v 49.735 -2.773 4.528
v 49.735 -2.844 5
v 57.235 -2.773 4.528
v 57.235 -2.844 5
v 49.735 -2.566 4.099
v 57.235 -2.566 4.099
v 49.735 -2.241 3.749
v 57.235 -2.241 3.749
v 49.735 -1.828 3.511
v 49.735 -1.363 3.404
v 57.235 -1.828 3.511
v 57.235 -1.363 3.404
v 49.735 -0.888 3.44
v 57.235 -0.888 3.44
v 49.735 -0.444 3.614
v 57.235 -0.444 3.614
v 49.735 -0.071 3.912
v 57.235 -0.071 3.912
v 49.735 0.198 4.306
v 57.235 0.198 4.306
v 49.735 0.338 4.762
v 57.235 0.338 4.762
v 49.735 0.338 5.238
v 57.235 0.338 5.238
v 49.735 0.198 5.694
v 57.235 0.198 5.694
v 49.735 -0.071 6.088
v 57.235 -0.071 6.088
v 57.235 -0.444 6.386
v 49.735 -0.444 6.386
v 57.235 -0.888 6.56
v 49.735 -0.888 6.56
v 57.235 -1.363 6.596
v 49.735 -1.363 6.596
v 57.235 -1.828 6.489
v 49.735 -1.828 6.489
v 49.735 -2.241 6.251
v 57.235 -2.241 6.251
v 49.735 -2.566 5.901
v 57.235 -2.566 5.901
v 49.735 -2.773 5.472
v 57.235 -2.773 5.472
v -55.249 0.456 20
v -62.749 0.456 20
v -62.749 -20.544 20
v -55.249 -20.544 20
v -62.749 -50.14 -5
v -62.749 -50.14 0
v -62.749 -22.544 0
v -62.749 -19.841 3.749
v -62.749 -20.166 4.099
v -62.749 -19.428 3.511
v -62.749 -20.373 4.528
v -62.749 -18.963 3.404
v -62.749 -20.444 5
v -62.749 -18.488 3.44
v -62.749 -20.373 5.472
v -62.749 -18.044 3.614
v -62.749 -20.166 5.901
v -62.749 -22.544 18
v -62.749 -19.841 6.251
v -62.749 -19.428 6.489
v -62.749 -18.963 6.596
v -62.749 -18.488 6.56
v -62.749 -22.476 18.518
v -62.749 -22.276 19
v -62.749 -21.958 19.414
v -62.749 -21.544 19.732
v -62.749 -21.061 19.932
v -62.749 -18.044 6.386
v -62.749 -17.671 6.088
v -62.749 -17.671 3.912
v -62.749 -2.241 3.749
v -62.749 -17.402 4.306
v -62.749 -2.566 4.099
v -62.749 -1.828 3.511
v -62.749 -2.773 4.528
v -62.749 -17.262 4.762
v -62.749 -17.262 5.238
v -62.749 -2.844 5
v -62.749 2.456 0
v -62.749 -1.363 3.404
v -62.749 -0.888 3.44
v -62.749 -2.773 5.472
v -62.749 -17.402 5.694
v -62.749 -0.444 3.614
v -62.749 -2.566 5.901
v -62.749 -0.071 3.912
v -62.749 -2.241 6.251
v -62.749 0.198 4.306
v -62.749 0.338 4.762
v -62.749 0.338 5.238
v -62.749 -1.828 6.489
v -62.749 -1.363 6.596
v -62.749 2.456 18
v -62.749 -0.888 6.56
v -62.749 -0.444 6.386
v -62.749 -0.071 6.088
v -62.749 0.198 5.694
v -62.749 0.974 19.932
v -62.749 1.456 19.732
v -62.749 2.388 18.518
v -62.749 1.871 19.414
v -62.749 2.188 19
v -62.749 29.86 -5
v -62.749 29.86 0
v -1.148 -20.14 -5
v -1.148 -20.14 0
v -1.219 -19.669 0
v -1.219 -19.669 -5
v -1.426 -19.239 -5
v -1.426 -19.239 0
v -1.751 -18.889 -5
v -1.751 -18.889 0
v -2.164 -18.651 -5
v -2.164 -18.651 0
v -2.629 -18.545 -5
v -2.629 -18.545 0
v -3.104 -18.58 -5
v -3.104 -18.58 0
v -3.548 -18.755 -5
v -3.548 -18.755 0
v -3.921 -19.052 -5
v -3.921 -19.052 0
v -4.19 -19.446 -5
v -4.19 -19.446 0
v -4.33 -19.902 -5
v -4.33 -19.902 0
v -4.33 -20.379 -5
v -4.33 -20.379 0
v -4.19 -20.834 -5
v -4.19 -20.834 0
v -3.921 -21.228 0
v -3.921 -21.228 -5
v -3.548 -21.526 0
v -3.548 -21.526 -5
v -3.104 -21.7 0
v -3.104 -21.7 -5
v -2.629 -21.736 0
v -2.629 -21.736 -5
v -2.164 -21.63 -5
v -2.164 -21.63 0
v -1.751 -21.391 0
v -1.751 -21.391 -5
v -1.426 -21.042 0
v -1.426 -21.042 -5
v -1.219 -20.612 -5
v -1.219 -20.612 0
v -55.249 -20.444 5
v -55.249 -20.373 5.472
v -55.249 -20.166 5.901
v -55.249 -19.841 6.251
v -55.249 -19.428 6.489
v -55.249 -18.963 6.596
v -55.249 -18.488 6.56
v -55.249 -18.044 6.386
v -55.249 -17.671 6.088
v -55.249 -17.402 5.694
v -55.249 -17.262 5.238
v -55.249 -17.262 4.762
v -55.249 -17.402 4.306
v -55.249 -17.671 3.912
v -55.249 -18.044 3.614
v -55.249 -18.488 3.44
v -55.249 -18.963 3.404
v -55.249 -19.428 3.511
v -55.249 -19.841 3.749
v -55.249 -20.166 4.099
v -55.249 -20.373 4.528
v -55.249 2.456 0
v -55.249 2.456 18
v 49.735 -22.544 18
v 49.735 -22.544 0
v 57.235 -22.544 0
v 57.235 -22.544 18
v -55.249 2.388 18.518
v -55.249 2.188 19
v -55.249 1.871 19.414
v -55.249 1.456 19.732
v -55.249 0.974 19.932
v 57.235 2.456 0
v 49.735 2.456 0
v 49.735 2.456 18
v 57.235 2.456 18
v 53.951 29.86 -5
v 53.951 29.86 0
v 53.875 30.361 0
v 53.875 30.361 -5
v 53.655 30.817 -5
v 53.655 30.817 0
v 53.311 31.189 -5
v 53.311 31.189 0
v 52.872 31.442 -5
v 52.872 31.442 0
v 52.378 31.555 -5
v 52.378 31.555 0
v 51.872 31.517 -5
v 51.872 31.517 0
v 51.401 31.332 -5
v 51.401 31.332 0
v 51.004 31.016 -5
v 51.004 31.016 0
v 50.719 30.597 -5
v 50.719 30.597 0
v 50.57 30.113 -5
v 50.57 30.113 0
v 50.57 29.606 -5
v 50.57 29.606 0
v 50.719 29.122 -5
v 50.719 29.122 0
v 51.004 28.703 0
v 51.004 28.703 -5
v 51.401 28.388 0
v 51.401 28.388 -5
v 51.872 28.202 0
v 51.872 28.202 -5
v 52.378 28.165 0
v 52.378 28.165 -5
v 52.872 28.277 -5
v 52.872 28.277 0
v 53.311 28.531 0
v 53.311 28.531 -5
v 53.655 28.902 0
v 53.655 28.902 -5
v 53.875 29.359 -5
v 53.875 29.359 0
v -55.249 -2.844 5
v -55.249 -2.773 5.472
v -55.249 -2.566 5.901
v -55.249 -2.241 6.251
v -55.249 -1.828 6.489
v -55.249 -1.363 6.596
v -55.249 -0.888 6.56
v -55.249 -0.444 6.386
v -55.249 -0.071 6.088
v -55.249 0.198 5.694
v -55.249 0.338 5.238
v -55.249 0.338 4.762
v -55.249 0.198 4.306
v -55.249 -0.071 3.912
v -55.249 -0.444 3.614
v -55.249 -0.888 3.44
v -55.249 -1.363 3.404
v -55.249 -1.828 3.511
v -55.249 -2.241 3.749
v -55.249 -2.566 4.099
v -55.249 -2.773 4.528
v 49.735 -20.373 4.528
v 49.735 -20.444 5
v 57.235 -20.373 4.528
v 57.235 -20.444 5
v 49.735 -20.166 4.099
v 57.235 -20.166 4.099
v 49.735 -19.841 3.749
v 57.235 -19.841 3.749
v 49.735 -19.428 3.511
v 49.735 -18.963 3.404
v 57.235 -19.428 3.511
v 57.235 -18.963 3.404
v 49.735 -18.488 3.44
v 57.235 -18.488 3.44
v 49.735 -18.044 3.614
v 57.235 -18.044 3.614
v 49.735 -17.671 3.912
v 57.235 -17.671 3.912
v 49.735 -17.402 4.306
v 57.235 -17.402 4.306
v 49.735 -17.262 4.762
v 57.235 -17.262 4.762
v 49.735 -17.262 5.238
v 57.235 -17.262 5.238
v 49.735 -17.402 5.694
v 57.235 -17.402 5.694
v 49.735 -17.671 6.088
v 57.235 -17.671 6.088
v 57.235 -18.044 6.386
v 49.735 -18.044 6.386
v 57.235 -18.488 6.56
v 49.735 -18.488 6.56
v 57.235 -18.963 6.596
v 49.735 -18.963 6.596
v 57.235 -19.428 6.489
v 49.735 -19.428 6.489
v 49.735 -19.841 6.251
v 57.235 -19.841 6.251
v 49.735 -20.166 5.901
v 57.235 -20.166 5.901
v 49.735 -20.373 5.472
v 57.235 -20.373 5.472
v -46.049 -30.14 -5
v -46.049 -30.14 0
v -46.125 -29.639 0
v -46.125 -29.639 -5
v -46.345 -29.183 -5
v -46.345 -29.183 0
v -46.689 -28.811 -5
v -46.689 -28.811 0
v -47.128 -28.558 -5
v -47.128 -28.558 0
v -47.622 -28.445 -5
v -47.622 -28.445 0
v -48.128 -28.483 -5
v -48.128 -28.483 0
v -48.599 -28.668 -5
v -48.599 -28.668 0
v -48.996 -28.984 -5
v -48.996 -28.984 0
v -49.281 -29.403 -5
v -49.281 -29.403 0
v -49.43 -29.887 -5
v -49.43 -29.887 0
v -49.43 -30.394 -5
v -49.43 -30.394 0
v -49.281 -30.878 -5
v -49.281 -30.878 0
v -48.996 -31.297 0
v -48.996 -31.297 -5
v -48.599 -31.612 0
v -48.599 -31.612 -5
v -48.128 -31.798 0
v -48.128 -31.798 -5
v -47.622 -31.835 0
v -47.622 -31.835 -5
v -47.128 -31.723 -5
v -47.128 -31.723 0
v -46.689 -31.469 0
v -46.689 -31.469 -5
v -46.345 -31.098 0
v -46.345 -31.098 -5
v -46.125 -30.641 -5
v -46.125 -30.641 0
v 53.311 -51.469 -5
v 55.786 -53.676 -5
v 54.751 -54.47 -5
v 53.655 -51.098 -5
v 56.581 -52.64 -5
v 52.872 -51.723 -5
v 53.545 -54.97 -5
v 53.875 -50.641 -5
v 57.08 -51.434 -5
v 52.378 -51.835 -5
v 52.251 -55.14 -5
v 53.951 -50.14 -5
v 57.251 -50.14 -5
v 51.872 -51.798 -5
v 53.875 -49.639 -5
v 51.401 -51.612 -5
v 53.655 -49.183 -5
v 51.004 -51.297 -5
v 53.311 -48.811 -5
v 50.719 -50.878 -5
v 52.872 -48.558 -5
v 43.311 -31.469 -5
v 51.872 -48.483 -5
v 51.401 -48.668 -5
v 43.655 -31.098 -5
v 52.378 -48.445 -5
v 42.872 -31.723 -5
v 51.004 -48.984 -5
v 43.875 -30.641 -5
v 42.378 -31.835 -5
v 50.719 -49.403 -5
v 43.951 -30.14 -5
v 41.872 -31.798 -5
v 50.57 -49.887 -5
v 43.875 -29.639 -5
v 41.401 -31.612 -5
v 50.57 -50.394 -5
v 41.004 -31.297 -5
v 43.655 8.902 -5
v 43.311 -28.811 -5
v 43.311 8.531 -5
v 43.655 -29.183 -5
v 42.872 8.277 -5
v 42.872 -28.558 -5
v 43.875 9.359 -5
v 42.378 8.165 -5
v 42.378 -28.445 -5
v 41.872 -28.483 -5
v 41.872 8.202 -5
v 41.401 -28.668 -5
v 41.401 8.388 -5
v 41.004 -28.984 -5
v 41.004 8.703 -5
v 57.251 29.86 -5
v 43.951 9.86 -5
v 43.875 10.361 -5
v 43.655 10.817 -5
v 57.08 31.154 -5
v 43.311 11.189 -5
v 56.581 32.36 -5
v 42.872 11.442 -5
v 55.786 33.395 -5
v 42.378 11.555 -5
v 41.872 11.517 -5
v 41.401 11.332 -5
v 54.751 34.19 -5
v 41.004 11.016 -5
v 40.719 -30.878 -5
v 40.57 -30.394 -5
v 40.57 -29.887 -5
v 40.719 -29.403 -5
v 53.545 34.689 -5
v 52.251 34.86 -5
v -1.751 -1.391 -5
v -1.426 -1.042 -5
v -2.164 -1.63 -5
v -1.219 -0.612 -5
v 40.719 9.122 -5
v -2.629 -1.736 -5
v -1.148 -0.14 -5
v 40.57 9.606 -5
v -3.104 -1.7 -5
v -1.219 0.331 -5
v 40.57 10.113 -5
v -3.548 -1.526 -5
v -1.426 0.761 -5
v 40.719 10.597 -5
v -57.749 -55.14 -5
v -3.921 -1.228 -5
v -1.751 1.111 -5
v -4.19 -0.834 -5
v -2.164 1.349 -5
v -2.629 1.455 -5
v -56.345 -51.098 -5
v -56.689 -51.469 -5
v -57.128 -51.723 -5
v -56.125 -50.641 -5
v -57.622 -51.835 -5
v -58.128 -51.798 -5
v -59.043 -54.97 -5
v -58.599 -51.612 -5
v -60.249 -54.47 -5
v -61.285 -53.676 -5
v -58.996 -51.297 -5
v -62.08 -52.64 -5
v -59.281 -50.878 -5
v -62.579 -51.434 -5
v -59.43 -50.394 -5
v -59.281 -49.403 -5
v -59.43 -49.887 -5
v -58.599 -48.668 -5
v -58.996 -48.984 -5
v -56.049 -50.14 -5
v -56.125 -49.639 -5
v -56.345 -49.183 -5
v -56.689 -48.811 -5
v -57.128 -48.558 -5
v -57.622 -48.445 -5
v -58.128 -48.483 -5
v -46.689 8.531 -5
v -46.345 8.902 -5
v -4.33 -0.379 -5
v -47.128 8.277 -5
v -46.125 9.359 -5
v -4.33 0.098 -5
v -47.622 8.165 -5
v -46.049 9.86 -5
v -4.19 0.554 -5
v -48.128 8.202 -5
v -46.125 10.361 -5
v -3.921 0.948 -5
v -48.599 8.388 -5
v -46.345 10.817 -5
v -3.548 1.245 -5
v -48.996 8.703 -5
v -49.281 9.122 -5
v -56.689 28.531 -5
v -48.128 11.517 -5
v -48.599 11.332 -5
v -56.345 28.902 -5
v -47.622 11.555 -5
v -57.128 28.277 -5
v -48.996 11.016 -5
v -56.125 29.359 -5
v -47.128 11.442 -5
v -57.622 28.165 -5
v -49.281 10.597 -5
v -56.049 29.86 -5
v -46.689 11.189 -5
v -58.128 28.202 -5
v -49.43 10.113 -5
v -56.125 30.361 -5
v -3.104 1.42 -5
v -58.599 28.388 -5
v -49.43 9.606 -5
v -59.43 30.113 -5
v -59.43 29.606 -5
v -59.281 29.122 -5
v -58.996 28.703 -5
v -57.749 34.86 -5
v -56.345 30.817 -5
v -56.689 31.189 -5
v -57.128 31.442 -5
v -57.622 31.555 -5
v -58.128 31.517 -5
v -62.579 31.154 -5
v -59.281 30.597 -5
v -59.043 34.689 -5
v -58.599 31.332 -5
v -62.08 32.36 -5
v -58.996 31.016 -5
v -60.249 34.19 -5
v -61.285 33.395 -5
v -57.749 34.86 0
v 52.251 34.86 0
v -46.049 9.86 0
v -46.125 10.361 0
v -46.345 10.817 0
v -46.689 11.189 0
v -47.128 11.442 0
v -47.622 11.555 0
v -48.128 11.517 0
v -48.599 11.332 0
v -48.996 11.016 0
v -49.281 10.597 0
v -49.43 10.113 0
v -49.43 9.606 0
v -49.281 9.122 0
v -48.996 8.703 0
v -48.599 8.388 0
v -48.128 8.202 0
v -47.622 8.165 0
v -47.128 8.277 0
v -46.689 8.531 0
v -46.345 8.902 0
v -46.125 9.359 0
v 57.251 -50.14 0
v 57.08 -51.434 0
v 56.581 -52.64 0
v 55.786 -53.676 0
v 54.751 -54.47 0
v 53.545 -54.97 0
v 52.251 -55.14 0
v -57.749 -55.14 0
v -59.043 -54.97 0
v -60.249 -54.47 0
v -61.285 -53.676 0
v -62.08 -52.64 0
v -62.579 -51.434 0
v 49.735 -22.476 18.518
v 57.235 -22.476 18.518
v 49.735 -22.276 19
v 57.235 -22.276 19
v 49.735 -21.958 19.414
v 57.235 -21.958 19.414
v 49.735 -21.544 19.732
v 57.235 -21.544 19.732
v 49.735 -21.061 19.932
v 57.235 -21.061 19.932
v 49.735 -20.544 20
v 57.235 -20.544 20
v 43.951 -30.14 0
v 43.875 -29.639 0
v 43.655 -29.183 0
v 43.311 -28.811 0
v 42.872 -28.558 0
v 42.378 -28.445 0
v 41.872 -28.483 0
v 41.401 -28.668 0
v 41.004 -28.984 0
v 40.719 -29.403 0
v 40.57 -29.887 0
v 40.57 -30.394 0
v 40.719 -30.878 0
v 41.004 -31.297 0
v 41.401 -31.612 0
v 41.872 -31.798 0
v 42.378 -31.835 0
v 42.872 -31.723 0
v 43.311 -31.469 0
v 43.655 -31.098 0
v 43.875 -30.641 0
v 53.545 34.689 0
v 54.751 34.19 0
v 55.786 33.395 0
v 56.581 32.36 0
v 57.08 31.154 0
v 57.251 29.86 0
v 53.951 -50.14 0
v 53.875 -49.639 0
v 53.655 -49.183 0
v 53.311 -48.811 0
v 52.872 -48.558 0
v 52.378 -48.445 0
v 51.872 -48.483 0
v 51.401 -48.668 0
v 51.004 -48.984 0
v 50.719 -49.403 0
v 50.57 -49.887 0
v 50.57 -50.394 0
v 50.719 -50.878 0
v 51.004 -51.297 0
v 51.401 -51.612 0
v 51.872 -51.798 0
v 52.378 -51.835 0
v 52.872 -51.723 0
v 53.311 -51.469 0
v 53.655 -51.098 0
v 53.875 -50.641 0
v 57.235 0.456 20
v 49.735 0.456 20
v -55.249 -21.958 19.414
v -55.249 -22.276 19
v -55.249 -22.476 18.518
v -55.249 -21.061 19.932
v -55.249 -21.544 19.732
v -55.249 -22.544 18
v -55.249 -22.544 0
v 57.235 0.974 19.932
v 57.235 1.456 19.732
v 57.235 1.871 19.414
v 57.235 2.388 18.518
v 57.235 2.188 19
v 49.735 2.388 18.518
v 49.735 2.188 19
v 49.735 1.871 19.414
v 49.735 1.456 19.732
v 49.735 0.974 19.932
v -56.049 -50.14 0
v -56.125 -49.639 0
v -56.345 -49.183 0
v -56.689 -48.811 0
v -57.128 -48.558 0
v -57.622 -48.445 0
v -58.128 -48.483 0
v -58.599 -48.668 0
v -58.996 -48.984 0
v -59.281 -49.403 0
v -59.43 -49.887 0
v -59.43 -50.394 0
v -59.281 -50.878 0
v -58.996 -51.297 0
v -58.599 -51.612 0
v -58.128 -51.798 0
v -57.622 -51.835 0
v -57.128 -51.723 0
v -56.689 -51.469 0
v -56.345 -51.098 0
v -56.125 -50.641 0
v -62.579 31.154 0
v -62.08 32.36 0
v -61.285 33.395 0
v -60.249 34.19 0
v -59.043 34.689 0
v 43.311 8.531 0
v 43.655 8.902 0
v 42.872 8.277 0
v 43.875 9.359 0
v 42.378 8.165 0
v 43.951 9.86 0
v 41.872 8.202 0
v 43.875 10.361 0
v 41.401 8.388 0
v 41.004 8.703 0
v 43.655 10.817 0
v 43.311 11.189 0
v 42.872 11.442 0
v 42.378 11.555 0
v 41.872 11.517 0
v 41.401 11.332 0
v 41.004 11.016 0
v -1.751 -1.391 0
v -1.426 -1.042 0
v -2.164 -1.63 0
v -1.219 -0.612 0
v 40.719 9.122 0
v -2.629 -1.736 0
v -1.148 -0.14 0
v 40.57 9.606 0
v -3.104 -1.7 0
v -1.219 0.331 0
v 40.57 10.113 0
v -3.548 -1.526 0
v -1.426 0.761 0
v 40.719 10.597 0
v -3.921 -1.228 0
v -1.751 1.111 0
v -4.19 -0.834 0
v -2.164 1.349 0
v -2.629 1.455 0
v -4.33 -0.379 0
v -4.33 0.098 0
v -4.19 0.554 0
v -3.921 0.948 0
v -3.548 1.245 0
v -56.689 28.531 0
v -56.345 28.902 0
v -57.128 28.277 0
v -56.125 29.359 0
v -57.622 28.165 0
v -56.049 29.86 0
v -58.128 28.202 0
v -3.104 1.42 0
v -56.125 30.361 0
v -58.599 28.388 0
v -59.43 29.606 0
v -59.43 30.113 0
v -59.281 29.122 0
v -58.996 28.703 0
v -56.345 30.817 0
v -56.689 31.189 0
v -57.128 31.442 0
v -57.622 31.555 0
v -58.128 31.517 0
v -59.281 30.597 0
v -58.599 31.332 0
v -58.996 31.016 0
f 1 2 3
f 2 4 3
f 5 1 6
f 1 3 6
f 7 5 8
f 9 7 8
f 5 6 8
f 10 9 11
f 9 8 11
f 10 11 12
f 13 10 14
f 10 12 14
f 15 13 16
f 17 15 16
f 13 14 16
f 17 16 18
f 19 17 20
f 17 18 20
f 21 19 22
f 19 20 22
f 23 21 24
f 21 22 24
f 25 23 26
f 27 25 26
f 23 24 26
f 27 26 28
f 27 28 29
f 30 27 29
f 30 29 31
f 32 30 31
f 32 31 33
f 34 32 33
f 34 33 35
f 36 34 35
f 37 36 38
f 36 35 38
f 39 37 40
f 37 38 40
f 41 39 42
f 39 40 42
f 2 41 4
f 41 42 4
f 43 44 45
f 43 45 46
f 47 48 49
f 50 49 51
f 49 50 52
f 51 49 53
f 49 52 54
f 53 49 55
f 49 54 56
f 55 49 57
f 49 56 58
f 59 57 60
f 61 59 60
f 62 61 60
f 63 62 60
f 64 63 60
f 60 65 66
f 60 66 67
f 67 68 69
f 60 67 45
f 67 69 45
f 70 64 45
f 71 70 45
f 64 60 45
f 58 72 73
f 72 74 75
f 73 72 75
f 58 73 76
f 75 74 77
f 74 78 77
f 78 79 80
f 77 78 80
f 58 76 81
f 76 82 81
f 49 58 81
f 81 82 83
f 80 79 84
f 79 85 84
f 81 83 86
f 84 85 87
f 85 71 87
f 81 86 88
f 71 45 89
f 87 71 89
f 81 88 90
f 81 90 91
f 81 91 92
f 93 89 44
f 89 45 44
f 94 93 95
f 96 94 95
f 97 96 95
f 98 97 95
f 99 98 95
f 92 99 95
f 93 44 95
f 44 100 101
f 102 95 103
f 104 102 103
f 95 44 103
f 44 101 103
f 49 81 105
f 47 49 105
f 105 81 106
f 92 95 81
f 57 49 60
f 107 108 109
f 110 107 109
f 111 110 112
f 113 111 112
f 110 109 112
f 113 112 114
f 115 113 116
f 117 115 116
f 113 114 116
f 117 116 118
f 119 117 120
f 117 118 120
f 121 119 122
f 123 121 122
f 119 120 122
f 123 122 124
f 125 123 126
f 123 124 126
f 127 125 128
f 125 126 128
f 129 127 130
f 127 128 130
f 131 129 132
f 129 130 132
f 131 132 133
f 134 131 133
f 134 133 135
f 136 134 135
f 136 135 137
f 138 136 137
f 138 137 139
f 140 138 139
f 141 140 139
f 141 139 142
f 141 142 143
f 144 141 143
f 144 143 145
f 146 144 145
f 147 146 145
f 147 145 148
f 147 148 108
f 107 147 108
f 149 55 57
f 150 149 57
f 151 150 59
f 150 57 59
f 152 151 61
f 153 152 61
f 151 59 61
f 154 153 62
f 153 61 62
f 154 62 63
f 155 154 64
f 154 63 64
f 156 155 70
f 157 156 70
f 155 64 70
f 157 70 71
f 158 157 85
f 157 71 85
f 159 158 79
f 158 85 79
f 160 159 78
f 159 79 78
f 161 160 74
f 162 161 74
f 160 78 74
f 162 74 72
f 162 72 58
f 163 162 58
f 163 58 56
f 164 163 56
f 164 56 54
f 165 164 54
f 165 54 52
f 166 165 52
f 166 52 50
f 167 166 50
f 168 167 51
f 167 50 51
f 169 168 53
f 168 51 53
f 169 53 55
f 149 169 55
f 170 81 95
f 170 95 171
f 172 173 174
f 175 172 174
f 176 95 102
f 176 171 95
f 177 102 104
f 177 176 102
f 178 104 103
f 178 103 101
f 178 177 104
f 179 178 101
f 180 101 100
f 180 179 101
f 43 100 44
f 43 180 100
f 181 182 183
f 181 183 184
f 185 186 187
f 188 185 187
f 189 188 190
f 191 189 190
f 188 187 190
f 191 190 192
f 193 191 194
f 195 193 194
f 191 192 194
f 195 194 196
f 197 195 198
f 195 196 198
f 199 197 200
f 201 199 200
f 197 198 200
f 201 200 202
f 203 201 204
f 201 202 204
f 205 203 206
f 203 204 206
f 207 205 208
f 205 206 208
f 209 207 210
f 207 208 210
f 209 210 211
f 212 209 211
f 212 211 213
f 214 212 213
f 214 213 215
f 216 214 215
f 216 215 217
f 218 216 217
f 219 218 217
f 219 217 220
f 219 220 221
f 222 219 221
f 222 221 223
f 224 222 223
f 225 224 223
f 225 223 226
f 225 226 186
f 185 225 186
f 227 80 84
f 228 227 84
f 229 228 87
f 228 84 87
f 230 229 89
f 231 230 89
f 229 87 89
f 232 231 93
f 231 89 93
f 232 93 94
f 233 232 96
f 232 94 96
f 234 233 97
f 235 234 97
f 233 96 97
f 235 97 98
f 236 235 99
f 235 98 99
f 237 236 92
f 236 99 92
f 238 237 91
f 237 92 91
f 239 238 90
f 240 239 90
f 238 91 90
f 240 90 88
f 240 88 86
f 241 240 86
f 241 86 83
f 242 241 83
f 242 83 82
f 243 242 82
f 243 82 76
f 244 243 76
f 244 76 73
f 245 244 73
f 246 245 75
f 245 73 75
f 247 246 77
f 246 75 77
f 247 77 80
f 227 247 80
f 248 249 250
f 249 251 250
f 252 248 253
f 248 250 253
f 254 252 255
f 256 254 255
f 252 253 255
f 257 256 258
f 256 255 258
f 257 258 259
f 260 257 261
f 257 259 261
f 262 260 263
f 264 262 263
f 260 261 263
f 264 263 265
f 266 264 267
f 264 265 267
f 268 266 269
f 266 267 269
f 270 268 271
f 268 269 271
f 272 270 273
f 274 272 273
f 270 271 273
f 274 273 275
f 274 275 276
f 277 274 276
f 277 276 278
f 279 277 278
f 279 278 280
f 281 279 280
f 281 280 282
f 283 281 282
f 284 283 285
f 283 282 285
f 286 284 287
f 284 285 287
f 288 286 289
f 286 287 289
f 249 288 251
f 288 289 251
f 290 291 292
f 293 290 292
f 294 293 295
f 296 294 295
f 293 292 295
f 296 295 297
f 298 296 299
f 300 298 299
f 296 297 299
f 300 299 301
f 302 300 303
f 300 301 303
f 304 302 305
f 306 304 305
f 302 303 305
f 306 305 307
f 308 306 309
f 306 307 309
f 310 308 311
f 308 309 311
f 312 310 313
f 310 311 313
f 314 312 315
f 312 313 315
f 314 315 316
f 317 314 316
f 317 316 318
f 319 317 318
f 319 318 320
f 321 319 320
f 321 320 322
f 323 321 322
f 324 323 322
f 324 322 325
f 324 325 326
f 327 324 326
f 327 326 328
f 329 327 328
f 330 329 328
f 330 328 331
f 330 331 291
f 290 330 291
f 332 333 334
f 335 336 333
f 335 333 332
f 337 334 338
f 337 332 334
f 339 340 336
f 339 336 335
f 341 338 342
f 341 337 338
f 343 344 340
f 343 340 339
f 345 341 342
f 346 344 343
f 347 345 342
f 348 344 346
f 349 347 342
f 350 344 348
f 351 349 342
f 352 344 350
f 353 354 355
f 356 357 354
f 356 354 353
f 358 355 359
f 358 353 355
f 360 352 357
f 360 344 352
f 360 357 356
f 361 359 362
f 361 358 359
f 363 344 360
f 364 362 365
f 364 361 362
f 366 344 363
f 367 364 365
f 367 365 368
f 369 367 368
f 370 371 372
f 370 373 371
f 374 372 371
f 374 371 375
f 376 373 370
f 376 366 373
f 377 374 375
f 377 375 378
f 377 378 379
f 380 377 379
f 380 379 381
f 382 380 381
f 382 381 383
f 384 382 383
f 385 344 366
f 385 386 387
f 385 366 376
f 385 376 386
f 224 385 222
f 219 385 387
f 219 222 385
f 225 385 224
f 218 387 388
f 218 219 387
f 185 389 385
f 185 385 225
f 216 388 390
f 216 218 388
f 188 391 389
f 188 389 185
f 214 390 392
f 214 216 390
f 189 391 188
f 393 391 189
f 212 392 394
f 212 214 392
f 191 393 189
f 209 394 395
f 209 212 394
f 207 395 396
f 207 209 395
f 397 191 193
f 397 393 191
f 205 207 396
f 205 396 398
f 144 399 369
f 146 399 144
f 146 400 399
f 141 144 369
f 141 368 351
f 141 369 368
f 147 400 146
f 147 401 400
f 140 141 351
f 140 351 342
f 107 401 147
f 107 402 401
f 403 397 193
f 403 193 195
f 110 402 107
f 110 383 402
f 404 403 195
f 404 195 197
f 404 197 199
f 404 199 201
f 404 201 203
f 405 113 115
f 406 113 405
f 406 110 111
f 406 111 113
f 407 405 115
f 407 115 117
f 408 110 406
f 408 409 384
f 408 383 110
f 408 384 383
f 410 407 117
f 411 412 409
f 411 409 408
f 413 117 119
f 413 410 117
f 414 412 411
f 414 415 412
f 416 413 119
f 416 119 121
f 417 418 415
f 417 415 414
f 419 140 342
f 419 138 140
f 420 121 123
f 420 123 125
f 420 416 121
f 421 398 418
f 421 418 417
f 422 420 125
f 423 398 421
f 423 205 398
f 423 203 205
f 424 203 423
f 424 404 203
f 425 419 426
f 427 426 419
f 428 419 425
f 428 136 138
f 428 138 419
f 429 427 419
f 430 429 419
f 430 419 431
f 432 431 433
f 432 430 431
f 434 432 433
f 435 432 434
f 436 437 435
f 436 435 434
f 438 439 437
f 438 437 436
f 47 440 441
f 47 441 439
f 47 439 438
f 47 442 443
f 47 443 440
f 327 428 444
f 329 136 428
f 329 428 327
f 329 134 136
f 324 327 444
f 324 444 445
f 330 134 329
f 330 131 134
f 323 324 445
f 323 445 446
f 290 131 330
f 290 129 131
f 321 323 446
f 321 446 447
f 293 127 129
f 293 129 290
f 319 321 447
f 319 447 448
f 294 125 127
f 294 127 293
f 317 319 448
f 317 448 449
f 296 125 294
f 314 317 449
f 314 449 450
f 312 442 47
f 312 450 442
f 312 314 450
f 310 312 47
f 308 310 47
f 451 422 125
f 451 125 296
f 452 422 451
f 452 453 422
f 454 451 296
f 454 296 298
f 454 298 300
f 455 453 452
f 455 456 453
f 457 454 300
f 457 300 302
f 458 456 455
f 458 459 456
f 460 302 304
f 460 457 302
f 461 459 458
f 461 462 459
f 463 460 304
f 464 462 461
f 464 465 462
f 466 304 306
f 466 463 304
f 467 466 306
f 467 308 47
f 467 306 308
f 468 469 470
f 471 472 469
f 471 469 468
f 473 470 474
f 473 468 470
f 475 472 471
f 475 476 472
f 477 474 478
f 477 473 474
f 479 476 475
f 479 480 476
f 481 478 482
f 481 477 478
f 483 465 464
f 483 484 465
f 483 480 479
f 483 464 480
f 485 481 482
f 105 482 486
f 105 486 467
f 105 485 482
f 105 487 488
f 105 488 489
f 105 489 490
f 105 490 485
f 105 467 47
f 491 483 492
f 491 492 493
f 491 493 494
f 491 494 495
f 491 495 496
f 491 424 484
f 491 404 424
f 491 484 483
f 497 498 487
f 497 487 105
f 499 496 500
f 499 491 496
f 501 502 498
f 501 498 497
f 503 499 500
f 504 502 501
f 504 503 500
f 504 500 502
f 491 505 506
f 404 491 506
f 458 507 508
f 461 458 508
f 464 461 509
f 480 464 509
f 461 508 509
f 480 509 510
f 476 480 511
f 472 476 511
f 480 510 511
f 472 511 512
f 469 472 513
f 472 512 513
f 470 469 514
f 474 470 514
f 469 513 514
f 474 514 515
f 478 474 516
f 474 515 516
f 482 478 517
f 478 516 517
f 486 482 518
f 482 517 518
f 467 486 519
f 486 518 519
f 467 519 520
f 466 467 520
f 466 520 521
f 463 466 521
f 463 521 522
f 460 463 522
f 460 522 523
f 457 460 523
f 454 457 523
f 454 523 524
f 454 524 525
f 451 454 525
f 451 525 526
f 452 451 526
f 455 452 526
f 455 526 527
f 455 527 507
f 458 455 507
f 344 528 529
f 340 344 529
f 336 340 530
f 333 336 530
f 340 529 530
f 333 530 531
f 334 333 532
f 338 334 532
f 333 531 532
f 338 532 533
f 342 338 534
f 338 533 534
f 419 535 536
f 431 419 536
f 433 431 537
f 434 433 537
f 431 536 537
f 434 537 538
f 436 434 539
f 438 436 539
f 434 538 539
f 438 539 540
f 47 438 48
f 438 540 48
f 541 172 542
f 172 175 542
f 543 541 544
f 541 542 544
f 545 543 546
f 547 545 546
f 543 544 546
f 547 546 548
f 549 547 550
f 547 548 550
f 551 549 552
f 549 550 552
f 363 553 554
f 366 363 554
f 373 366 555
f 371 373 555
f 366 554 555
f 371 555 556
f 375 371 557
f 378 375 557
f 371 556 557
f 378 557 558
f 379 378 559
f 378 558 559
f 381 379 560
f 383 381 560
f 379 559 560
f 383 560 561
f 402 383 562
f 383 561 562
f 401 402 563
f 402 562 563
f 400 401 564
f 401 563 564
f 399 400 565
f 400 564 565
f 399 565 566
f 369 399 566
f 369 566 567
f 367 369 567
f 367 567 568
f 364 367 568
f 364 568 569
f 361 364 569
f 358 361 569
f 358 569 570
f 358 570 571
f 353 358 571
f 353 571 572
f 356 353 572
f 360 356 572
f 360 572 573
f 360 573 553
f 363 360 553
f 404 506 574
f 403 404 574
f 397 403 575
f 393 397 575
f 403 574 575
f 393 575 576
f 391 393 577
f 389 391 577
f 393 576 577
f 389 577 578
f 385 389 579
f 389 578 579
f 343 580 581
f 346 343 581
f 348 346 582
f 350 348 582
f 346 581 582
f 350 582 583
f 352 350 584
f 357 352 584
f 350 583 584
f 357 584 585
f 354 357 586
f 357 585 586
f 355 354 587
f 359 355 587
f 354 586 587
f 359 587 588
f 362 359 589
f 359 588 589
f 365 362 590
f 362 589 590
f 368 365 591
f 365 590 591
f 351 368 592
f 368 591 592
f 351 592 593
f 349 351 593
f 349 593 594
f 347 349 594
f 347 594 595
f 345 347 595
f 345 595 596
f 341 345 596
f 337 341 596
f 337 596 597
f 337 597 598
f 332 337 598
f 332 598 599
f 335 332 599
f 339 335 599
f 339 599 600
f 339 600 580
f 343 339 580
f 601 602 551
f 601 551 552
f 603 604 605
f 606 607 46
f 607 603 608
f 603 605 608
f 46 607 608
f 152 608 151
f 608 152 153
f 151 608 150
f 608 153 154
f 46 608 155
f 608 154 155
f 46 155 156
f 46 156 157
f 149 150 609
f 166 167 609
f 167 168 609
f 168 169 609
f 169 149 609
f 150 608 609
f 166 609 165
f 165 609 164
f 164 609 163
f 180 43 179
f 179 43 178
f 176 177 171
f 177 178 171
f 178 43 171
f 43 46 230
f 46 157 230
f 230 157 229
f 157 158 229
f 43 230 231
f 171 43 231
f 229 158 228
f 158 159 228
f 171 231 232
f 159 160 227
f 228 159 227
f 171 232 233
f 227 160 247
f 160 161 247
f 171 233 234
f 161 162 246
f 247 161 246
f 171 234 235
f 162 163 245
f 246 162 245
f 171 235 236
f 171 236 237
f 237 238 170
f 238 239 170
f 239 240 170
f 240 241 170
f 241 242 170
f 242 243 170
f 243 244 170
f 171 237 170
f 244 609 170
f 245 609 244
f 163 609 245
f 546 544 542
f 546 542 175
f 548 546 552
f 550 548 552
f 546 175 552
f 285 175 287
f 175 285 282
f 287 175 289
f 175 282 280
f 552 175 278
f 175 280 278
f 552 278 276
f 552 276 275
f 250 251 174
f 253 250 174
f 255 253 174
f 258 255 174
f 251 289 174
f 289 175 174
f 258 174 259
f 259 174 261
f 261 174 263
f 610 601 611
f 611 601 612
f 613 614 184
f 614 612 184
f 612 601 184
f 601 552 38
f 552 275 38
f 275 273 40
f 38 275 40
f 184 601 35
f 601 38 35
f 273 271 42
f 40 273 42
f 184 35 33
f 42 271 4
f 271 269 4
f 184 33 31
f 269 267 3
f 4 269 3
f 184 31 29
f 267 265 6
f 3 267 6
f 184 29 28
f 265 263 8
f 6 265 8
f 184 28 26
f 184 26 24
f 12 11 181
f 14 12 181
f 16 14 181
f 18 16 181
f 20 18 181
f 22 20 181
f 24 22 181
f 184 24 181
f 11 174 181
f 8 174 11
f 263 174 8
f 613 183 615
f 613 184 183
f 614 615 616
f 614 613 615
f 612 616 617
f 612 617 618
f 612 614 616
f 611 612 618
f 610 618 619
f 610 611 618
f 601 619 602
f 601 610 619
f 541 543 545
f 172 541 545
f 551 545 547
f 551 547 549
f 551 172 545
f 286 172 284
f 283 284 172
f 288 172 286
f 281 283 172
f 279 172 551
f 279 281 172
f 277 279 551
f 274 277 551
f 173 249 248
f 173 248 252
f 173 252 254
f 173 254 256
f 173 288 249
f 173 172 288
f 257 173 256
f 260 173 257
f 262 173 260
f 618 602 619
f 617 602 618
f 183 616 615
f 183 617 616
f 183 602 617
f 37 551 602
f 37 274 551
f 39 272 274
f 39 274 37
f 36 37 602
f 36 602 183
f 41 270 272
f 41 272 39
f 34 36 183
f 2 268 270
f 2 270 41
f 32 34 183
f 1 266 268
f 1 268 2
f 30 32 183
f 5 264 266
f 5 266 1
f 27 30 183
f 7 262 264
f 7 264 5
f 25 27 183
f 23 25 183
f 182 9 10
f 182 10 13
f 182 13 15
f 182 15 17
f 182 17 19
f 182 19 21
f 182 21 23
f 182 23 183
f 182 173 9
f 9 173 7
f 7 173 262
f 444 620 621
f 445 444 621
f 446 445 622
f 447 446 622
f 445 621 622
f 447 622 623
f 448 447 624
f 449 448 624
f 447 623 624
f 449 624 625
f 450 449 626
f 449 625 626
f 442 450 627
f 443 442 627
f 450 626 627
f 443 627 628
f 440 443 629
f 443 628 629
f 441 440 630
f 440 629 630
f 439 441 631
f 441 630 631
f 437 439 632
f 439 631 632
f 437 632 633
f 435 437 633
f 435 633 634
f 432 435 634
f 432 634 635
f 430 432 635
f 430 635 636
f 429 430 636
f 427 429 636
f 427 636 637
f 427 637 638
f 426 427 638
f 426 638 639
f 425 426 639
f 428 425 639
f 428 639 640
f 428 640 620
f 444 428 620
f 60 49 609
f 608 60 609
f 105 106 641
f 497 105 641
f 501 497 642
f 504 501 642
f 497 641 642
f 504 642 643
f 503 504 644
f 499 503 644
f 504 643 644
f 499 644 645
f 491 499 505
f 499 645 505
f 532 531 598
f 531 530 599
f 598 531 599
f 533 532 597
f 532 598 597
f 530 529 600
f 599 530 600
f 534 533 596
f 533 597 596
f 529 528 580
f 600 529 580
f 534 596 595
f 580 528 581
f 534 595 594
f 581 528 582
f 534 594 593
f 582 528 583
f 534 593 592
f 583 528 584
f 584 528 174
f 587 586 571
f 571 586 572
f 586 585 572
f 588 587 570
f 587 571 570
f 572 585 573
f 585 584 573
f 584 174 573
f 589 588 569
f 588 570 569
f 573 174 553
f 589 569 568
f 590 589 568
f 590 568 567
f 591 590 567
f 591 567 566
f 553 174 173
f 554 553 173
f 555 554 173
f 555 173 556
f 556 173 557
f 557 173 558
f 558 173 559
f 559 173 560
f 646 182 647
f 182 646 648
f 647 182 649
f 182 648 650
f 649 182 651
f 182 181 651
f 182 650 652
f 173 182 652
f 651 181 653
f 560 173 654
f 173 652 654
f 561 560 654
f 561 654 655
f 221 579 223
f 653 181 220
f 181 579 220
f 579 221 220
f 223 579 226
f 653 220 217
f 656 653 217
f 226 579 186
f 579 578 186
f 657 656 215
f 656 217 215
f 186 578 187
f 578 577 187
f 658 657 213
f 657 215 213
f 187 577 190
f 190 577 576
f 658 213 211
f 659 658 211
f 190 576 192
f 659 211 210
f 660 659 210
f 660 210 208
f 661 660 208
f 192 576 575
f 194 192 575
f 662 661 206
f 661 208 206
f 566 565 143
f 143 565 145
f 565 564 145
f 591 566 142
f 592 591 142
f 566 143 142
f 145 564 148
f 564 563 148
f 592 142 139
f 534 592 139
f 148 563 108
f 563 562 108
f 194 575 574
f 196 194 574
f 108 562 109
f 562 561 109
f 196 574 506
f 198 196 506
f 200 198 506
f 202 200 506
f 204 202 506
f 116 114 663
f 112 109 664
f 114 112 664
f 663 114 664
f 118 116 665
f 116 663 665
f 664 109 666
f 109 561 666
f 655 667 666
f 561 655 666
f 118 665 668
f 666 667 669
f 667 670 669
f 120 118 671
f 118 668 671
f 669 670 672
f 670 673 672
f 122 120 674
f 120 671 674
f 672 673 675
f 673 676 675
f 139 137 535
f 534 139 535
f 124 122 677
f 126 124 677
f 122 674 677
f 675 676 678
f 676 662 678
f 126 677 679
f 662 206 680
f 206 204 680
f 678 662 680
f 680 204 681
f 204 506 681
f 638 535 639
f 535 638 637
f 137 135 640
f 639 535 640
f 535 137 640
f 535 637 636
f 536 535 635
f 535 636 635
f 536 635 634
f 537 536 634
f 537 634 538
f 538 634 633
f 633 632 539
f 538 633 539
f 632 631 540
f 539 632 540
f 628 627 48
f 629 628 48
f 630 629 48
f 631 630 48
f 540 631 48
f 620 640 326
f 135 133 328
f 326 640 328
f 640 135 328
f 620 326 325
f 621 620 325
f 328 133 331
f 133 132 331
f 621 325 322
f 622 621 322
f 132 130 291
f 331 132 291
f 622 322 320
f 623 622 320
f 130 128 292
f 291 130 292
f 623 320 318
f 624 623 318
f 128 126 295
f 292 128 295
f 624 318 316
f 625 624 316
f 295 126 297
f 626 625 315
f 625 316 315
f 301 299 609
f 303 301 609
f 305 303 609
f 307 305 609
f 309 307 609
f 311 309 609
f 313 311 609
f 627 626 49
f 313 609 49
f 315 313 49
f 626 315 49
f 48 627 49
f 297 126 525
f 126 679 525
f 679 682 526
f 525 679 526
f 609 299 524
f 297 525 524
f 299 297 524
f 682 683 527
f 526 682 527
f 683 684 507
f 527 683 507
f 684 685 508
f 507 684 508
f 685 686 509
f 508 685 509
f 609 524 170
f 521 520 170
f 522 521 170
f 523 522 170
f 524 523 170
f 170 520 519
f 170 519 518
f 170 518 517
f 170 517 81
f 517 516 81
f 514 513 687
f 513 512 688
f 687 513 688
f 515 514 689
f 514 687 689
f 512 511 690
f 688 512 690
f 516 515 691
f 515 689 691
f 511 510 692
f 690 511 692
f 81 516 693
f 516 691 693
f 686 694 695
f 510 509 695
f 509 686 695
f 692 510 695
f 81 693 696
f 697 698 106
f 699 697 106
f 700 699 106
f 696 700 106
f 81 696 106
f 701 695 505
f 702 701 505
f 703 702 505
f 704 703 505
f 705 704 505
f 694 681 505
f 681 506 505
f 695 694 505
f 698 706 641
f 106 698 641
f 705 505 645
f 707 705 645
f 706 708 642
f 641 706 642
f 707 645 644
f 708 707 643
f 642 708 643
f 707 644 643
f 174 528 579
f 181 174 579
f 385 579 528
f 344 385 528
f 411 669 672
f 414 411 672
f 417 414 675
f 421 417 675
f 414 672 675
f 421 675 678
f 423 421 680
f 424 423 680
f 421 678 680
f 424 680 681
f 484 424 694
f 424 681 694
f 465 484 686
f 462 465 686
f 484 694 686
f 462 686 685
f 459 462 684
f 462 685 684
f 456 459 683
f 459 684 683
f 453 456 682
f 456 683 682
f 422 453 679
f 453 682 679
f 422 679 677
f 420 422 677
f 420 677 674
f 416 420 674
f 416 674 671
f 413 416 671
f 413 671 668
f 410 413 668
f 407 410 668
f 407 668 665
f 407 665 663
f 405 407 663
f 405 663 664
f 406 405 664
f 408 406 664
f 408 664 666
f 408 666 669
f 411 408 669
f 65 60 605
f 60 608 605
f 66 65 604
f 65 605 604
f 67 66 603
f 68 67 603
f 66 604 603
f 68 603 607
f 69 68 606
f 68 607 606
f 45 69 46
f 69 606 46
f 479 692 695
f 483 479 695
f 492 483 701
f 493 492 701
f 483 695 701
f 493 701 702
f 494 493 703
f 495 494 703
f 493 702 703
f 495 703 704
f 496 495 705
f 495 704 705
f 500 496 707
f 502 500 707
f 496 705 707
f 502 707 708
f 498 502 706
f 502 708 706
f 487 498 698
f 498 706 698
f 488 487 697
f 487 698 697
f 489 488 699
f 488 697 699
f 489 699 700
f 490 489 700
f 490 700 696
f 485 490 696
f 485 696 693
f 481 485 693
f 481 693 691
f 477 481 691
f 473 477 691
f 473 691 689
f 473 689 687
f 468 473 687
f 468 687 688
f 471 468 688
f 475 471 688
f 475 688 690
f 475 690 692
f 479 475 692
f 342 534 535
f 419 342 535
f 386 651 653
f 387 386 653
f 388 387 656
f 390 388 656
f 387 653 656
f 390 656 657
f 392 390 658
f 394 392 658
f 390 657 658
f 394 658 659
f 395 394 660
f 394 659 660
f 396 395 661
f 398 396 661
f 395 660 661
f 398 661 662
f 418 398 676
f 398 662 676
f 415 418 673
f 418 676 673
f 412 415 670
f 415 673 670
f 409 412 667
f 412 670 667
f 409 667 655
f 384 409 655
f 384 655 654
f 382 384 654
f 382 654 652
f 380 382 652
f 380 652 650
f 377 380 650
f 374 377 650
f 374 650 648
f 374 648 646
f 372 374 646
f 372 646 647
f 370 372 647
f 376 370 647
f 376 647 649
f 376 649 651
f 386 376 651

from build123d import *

# Parameters (mm, degrees)
EXTRUDE_1_DEPTH        = 5
SKETCH_1_4_OUTSIDE_W   = 152.016
SKETCH_1_4_OUTSIDE_H   = 122.016
SKETCH_1_4_OUTSIDE_R   = 1.7
SKETCH_1_4_OUTSIDE_R_2 = 1.6
CUT_EXTRUDE_3_DEPTH    = 84.683501662
SKETCH_2_W             = 7.5
SKETCH_2_H             = 25
EXTRUDE_2_DEPTH        = 20
FILLET_1_R             = 2
SKETCH_6_R             = 1.6
CUT_EXTRUDE_4_DEPTH    = 7.5
SKETCH_7_R             = 1.6
CUT_EXTRUDE_5_DEPTH    = 134.554368416


with BuildPart() as part:
    # 스케치1 → 보스-돌출1 (new body)
    with BuildSketch(Plane.XY):
        with BuildLine():
            Line((-57.749377558, 34.859778143), (52.250622442, 34.859778143))
            ThreePointArc((52.250622442, 34.859778143), (55.786156348, 33.395312049), (57.250622442, 29.859778143))
            Line((57.250622442, 29.859778143), (57.250622442, -50.140221857))
            ThreePointArc((57.250622442, -50.140221857), (55.786156348, -53.675755763), (52.250622442, -55.140221857))
            Line((52.250622442, -55.140221857), (-57.749377558, -55.140221857))
            ThreePointArc((-57.749377558, -55.140221857), (-61.284911464, -53.675755763), (-62.749377558, -50.140221857))
            Line((-62.749377558, -50.140221857), (-62.749377558, 29.859778143))
            ThreePointArc((-62.749377558, 29.859778143), (-61.284911464, 33.395312049), (-57.749377558, 34.859778143))
        make_face()
    extrude(amount=-EXTRUDE_1_DEPTH)

    # 스케치1<4> outside → 컷-돌출3 (cut, through all)
    # profile 1 of 11: a face of its own
    with BuildSketch(Plane.XY):
        with Locations((-2.749, -10.14)):
            Rectangle(SKETCH_1_4_OUTSIDE_W, SKETCH_1_4_OUTSIDE_H)
        with BuildLine():
            Line((-57.749377558, 34.859778143), (52.250622442, 34.859778143))
            ThreePointArc((52.250622442, 34.859778143), (55.786156348, 33.395312049), (57.250622442, 29.859778143))
            Line((57.250622442, 29.859778143), (57.250622442, -50.140221857))
            ThreePointArc((57.250622442, -50.140221857), (55.786156348, -53.675755763), (52.250622442, -55.140221857))
            Line((52.250622442, -55.140221857), (-57.749377558, -55.140221857))
            ThreePointArc((-57.749377558, -55.140221857), (-61.284911464, -53.675755763), (-62.749377558, -50.140221857))
            Line((-62.749377558, -50.140221857), (-62.749377558, 29.859778143))
            ThreePointArc((-62.749377558, 29.859778143), (-61.284911464, 33.395312049), (-57.749377558, 34.859778143))
        make_face(mode=Mode.SUBTRACT)
    # profile 2 of 11: a face of its own
    with BuildSketch(Plane.XY):
        with Locations((-57.749377558, 29.859778143)):
            Circle(SKETCH_1_4_OUTSIDE_R)
    # profile 3 of 11: a face of its own
    with BuildSketch(Plane.XY):
        with Locations((52.250622442, 29.859778143)):
            Circle(SKETCH_1_4_OUTSIDE_R)
    # profile 4 of 11: a face of its own
    with BuildSketch(Plane.XY):
        with Locations((-57.749377558, -50.140221857)):
            Circle(SKETCH_1_4_OUTSIDE_R)
    # profile 5 of 11: a face of its own
    with BuildSketch(Plane.XY):
        with Locations((52.250622442, -50.140221857)):
            Circle(SKETCH_1_4_OUTSIDE_R)
    # profile 6 of 11: a face of its own
    with BuildSketch(Plane.XY):
        with Locations((-47.749377558, 9.859778143)):
            Circle(SKETCH_1_4_OUTSIDE_R)
    # profile 7 of 11: a face of its own
    with BuildSketch(Plane.XY):
        with Locations((-47.749377558, -30.140221857)):
            Circle(SKETCH_1_4_OUTSIDE_R)
    # profile 8 of 11: a face of its own
    with BuildSketch(Plane.XY):
        with Locations((42.250622442, 9.859778143)):
            Circle(SKETCH_1_4_OUTSIDE_R)
    # profile 9 of 11: a face of its own
    with BuildSketch(Plane.XY):
        with Locations((42.250622442, -30.140221857)):
            Circle(SKETCH_1_4_OUTSIDE_R)
    # profile 10 of 11: a face of its own
    with BuildSketch(Plane.XY):
        with Locations((-2.74831555, -0.140221857)):
            Circle(SKETCH_1_4_OUTSIDE_R_2)
    # profile 11 of 11: a face of its own
    with BuildSketch(Plane.XY):
        with Locations((-2.74831555, -20.140221857)):
            Circle(SKETCH_1_4_OUTSIDE_R_2)
    extrude(amount=-CUT_EXTRUDE_3_DEPTH, mode=Mode.SUBTRACT)

    # 스케치2 → 보스-돌출2 (add)
    with BuildSketch(Plane.XY):
        with Locations((-58.999377558, -10.043662602)):
            Rectangle(SKETCH_2_W, SKETCH_2_H)
        with Locations((53.485310034, -10.043662602)):
            Rectangle(SKETCH_2_W, SKETCH_2_H)
    extrude(amount=EXTRUDE_2_DEPTH)

    # 필렛1
    fillet_1_edges = [part.edges().sort_by_distance(p)[0] for p in [
        (-58.999377558, -22.543662602, 20),
        (-58.999377558, 2.456337398, 20),
        (53.485310034, 2.456337398, 20),
        (53.485310034, -22.543662602, 20),
    ]]
    fillet(fillet_1_edges, radius=FILLET_1_R)

    # 스케치6 → 컷-돌출4 (cut)
    with BuildSketch(Plane.ZY.offset(62.749377558)):
        with Locations(Location((5, -18.843662602, 0), (0, 0, 270))):
            Circle(SKETCH_6_R)
        with Locations(Location((5, -1.243662602, 0), (0, 0, 270))):
            Circle(SKETCH_6_R)
    extrude(amount=-CUT_EXTRUDE_4_DEPTH, mode=Mode.SUBTRACT)

    # 스케치7 → 컷-돌출5 (cut, through all)
    with BuildSketch(Plane(origin=(57.235310034, 0, 0), x_dir=(0, 0, -1), z_dir=(1, 0, 0))):
        with Locations(Location((-5, -1.243662602, 0), (0, 0, 270))):
            Circle(SKETCH_7_R)
        with Locations(Location((-5, -18.843662602, 0), (0, 0, 270))):
            Circle(SKETCH_7_R)
    extrude(amount=-CUT_EXTRUDE_5_DEPTH, mode=Mode.SUBTRACT)


solid = part.part
